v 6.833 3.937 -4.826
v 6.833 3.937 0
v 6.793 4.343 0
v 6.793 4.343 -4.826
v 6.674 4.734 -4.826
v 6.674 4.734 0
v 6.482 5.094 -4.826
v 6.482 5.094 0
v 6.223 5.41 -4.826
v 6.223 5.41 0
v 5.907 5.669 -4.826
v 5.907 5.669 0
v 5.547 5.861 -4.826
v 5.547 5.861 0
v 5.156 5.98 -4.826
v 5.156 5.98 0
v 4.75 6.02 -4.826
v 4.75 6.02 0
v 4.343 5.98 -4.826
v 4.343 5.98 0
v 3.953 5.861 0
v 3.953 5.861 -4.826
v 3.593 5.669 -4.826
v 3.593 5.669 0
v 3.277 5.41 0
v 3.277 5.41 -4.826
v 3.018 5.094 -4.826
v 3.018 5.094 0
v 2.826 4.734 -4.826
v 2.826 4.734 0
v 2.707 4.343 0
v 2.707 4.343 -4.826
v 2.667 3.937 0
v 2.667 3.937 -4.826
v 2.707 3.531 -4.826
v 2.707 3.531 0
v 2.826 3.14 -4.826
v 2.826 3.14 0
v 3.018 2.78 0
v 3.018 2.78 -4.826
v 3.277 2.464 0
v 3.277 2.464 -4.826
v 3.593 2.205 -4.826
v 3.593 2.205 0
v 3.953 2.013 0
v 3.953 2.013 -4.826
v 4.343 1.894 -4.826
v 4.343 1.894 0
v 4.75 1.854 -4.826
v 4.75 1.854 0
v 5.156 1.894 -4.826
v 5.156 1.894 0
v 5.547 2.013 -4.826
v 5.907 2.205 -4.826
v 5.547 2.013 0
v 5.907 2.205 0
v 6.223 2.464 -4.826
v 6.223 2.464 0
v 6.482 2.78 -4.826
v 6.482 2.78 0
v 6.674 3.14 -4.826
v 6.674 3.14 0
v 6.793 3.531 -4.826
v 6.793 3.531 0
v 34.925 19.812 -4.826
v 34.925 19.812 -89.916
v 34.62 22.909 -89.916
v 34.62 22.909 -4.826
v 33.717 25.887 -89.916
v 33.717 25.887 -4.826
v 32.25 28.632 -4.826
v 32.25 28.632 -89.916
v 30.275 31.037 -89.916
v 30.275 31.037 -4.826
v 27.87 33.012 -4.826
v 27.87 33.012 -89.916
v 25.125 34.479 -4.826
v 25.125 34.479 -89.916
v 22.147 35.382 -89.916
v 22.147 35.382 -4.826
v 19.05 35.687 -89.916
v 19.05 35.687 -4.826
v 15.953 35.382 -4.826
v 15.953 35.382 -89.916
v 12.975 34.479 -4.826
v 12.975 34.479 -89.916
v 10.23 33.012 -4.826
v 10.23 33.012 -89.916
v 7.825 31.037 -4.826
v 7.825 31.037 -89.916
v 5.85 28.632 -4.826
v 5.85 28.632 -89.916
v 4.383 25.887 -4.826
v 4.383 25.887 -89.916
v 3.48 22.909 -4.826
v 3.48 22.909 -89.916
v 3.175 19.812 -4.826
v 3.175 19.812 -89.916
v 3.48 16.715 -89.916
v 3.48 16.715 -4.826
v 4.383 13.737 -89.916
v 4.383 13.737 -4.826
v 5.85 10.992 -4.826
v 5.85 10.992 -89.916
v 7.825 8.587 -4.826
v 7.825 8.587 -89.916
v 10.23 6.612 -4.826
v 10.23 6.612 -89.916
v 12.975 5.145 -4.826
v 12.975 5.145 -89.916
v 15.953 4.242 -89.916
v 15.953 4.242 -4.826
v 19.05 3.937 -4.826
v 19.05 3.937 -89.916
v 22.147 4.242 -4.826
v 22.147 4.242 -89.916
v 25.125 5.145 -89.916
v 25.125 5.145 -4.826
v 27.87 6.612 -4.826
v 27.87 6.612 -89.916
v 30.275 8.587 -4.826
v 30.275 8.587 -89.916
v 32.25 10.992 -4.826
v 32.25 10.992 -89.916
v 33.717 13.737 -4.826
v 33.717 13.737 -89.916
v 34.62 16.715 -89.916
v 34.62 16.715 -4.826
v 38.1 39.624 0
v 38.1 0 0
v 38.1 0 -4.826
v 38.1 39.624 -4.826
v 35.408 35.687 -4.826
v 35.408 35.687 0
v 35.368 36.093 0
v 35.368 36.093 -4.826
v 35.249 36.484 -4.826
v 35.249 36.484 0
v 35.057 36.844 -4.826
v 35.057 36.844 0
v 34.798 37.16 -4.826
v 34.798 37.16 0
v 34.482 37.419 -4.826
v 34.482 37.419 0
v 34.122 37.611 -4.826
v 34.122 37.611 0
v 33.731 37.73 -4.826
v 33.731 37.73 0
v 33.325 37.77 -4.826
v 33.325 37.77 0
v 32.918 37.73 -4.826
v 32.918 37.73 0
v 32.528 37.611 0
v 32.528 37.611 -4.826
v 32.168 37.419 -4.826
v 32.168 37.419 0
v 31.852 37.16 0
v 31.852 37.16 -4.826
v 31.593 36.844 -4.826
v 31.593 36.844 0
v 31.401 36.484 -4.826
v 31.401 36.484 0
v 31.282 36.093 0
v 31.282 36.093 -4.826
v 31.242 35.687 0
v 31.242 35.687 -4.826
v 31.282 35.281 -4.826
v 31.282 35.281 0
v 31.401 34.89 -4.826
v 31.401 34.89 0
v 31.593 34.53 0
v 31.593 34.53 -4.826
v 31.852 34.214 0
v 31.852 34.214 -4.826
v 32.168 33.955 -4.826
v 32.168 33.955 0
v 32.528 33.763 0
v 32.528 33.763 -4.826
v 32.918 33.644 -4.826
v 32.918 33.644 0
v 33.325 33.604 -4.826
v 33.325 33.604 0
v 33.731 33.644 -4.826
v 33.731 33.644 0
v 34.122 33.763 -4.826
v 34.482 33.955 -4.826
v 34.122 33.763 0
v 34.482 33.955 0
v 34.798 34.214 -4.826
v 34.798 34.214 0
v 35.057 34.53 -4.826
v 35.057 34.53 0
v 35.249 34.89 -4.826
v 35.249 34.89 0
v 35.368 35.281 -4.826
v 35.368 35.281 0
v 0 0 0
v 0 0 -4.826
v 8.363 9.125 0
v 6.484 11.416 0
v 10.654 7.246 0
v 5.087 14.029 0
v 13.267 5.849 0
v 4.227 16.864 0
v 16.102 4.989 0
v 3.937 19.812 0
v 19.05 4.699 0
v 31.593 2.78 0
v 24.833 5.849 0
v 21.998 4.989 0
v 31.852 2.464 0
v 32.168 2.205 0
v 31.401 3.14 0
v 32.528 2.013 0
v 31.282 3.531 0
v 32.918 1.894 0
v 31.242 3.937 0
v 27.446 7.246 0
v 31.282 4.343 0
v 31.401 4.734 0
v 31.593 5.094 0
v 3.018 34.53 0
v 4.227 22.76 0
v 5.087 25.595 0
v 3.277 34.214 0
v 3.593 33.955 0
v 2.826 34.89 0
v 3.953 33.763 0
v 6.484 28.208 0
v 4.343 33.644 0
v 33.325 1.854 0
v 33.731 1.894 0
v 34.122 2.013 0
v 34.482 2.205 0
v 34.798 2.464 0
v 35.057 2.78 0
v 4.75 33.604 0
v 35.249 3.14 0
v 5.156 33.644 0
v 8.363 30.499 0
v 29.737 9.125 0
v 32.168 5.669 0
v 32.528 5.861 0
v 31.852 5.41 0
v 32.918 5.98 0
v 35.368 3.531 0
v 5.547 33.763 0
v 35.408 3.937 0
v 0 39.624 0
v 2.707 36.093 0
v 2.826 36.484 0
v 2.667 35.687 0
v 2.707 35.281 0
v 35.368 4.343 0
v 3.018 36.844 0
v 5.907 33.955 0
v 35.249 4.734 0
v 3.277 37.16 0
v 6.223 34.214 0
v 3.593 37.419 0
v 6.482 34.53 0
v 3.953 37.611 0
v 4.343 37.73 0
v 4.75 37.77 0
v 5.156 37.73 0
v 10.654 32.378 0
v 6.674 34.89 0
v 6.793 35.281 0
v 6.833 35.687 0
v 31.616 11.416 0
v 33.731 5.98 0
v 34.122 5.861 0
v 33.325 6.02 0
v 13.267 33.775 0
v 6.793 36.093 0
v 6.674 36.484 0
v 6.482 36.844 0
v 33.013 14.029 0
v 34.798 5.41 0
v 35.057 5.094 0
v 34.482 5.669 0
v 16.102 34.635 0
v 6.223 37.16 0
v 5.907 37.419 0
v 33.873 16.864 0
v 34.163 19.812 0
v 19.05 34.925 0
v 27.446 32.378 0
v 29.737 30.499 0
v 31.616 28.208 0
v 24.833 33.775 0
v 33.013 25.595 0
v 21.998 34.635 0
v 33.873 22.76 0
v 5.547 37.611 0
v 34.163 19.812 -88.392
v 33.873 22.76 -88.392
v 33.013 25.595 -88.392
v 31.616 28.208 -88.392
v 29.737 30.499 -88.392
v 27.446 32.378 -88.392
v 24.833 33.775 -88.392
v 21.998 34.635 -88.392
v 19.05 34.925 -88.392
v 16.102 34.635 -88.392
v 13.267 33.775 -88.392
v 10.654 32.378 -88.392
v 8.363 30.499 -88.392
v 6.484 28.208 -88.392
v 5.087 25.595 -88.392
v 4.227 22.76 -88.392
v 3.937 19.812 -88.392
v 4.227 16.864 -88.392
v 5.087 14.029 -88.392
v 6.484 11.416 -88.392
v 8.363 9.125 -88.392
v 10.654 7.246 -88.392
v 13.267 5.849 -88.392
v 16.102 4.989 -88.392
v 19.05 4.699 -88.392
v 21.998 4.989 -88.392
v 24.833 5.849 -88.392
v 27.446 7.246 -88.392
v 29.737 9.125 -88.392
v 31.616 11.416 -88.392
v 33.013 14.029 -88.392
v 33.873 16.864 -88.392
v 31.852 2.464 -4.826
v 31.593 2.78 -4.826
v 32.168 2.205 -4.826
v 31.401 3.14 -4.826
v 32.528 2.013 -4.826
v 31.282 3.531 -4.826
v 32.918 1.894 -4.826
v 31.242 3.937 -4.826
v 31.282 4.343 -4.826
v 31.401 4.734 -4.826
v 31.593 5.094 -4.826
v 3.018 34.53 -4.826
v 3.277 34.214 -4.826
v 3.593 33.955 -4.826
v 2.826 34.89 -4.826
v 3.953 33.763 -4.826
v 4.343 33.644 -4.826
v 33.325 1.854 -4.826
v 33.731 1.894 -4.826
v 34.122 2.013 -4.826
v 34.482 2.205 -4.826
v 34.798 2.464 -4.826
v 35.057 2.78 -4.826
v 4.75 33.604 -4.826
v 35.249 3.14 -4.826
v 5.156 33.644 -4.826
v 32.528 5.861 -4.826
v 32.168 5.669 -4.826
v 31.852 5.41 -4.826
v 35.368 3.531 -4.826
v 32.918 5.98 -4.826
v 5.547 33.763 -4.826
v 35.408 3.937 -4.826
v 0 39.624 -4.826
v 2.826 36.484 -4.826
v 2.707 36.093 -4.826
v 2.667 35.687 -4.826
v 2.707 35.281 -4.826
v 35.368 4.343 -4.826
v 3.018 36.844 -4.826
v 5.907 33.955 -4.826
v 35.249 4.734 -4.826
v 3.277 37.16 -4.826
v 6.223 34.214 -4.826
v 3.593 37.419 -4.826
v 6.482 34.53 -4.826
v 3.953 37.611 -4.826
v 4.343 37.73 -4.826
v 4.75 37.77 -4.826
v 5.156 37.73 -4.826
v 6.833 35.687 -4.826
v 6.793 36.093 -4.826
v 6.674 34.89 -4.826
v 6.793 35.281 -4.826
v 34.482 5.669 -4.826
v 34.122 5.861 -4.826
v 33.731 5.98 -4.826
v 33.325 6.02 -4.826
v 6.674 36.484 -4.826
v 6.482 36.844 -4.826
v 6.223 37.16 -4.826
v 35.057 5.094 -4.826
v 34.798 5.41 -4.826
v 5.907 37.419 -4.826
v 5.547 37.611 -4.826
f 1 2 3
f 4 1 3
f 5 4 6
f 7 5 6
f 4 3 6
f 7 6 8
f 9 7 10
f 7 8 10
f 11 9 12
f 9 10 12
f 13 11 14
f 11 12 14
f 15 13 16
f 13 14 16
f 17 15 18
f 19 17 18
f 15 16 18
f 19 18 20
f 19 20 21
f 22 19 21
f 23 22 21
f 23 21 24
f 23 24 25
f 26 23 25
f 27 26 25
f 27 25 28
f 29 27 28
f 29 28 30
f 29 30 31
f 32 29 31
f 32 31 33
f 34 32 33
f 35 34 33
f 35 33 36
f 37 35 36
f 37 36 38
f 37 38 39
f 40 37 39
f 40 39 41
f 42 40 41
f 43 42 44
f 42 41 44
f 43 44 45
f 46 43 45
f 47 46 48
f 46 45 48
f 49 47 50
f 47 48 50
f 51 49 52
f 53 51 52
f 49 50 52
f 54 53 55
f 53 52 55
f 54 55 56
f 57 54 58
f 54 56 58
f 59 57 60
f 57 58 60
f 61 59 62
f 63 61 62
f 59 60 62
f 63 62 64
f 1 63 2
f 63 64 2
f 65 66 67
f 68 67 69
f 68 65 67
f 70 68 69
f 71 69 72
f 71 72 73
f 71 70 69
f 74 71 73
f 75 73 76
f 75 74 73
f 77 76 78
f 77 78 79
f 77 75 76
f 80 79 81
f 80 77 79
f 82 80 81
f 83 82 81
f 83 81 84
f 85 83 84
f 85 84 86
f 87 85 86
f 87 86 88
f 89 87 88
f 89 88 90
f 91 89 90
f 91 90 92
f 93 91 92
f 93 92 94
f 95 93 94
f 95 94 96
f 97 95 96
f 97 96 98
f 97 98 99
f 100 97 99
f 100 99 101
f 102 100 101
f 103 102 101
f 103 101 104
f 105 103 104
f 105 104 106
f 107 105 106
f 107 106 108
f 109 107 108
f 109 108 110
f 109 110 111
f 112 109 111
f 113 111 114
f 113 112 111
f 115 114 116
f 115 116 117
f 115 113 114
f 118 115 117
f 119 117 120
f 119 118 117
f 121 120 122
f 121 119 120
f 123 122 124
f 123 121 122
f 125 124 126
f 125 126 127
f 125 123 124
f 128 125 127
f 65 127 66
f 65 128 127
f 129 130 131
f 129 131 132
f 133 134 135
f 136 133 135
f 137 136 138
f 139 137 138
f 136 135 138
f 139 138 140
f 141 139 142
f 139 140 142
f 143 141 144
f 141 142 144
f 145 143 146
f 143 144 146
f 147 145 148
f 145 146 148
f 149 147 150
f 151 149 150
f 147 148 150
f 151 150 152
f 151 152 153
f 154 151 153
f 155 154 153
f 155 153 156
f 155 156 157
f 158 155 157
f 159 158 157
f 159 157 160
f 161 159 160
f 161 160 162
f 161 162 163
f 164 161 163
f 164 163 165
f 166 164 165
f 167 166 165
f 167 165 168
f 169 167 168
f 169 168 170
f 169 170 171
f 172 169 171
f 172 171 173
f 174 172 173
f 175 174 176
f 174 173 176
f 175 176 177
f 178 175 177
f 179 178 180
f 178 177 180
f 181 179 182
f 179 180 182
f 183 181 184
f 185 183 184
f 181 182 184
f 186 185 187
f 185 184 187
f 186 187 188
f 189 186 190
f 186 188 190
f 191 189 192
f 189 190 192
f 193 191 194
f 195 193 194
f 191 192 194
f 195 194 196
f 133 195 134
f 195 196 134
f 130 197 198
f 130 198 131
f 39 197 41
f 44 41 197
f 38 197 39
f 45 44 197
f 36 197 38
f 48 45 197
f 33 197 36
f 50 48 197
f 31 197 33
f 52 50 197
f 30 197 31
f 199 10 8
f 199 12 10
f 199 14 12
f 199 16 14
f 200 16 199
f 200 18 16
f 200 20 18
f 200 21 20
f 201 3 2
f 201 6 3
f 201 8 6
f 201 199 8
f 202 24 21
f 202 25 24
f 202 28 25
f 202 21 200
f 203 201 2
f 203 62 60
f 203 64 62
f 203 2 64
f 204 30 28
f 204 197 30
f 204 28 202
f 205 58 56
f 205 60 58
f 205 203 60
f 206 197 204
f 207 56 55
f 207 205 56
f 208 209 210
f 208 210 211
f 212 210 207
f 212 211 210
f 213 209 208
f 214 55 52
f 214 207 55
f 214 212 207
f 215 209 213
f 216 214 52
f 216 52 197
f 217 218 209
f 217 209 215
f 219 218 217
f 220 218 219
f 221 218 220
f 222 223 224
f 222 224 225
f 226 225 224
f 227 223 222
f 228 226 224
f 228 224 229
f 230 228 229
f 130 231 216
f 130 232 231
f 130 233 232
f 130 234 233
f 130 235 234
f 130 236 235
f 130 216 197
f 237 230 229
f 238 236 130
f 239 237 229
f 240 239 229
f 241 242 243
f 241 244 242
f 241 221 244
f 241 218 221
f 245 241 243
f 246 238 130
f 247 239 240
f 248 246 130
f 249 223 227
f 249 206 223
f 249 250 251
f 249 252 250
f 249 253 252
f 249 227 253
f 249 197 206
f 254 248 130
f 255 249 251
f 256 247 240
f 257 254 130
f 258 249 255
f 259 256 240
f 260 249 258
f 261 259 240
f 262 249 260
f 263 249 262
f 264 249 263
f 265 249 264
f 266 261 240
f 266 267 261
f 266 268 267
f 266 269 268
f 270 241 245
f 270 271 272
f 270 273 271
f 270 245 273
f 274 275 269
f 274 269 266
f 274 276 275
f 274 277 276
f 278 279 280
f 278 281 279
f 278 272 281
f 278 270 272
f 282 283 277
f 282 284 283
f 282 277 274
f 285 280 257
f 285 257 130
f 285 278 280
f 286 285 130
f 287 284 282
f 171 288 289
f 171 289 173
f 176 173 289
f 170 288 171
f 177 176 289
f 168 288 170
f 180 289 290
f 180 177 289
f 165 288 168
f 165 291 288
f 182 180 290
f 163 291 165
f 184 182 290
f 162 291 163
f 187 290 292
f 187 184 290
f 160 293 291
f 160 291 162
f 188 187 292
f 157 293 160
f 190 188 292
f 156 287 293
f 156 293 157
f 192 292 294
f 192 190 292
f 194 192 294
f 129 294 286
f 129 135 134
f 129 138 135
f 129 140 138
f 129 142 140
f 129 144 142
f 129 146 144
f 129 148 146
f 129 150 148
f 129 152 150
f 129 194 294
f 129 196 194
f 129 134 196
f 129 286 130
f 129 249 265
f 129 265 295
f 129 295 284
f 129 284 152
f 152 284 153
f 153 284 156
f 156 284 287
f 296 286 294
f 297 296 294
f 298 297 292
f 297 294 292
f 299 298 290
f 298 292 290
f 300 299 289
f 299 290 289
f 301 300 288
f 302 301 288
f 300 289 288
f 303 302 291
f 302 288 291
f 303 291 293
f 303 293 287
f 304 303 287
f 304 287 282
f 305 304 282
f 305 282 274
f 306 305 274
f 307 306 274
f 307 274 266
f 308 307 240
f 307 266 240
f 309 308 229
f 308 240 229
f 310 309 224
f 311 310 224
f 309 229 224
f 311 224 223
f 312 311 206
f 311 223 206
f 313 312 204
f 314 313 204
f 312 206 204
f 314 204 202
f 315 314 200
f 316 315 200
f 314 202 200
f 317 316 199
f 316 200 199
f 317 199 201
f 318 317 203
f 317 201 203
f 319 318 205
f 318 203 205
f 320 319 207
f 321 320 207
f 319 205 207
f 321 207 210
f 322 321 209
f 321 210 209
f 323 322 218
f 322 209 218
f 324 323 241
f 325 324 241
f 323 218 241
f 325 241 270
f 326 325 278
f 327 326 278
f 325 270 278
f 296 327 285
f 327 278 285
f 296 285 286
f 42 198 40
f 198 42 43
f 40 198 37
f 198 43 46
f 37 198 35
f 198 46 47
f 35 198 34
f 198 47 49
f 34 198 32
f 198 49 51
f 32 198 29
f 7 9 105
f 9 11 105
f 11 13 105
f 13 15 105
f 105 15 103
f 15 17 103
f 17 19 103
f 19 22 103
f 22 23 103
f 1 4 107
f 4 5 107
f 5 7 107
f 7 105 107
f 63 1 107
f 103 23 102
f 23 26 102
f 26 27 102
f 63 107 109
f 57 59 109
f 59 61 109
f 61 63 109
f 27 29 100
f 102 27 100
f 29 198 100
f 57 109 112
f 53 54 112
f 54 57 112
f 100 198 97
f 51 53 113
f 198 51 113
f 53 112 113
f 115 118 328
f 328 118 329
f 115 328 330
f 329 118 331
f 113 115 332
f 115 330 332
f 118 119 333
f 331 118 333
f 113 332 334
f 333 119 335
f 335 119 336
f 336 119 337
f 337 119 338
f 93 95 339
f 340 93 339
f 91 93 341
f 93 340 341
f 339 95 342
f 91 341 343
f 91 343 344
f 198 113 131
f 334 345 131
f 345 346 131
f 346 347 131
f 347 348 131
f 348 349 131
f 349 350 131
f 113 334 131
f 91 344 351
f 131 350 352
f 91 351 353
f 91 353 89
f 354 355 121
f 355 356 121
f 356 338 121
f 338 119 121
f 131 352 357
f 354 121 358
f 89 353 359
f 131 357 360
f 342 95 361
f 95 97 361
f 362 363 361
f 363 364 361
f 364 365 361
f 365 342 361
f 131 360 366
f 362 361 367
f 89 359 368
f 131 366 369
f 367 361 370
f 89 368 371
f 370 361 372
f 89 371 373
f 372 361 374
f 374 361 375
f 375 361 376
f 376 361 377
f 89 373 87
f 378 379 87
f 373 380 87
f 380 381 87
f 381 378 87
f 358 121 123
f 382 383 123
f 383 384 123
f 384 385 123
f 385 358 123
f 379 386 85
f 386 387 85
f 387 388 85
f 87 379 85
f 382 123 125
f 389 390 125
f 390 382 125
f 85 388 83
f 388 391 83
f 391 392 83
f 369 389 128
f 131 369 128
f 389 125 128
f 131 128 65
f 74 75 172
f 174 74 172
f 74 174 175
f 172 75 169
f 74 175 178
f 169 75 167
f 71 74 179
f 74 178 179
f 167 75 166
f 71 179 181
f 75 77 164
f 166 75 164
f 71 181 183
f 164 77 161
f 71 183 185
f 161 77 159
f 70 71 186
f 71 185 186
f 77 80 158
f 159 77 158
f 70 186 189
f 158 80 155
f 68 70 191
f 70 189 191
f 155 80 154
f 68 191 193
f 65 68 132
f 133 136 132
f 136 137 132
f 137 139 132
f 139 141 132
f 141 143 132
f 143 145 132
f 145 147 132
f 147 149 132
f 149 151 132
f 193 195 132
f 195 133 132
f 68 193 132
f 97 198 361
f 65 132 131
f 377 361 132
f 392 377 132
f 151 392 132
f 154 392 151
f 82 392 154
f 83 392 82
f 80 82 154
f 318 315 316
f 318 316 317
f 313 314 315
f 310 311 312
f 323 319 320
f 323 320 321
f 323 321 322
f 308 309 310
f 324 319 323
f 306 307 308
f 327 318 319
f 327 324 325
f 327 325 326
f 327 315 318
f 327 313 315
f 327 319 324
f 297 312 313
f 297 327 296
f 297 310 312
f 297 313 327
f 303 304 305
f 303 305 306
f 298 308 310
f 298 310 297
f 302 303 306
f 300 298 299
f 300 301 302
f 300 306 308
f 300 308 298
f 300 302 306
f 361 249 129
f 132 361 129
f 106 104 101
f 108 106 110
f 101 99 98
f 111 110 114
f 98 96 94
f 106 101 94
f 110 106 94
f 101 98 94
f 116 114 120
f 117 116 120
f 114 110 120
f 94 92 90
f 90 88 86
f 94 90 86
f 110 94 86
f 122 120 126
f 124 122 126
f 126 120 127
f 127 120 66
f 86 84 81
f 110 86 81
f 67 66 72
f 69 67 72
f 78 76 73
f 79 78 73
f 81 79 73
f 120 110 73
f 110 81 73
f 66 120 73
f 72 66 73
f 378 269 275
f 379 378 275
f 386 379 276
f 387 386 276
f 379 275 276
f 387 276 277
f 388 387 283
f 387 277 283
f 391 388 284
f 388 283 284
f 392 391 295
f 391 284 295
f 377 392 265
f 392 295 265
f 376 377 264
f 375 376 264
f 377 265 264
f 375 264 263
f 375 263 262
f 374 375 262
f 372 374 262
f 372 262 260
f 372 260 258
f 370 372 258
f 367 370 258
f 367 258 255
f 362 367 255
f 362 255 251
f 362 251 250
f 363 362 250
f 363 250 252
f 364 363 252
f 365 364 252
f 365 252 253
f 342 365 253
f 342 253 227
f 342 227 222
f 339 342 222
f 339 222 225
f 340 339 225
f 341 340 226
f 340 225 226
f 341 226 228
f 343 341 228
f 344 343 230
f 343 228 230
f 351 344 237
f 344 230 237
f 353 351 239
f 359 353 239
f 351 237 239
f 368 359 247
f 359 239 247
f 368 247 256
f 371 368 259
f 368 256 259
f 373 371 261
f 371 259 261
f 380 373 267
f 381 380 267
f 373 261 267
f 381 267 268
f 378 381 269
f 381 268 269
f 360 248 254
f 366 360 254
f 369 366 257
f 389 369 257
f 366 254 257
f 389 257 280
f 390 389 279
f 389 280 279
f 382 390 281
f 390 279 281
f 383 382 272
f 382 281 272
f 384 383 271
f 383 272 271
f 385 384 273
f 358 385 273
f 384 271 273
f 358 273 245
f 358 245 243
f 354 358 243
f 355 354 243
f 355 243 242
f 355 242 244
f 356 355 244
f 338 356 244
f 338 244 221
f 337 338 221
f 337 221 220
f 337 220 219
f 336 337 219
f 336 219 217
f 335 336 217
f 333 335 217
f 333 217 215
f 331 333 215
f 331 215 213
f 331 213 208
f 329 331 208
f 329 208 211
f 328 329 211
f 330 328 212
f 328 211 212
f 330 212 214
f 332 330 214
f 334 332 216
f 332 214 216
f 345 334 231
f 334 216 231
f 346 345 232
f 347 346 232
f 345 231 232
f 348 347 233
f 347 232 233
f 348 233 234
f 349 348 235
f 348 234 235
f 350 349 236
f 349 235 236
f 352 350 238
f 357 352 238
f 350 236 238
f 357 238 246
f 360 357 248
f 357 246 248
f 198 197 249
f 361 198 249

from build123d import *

# Parameters (mm, degrees)
F0_W     = 38.1
F0_H     = 39.624
F1_DEPTH = 4.826
F2_R     = 15.875
F3_DEPTH = 89.916
F4_R     = 15.113
F5_DEPTH = 88.392
F6_R     = 2.0828
F7_DEPTH = 89.917


with BuildPart() as f1:
    # F0 (on Top) → F1 (new body)
    with BuildSketch(Plane.XY):
        with Locations((19.05, 19.812)):
            Rectangle(F0_W, F0_H)
    extrude(amount=-F1_DEPTH)

    # F2 (on face) → F3 (join)
    with BuildSketch(Plane.XY):
        with Locations((19.05, 19.812)):
            Circle(F2_R)
    extrude(amount=-F3_DEPTH)

    # F4 (on face) → F5 (cut)
    with BuildSketch(Plane.XY):
        with Locations((19.05, 19.812)):
            Circle(F4_R)
    extrude(amount=-F5_DEPTH, mode=Mode.SUBTRACT)

    # F6 (on Top) → F7 (cut, through all)
    with BuildSketch(Plane.XY):
        with Locations((33.3248, 35.687)):
            Circle(F6_R)
        with Locations((33.3248, 3.937)):
            Circle(F6_R)
        with Locations((4.7498, 35.687)):
            Circle(F6_R)
        with Locations((4.7498, 3.937)):
            Circle(F6_R)
    extrude(amount=-F7_DEPTH, mode=Mode.SUBTRACT)


solid = f1.part
